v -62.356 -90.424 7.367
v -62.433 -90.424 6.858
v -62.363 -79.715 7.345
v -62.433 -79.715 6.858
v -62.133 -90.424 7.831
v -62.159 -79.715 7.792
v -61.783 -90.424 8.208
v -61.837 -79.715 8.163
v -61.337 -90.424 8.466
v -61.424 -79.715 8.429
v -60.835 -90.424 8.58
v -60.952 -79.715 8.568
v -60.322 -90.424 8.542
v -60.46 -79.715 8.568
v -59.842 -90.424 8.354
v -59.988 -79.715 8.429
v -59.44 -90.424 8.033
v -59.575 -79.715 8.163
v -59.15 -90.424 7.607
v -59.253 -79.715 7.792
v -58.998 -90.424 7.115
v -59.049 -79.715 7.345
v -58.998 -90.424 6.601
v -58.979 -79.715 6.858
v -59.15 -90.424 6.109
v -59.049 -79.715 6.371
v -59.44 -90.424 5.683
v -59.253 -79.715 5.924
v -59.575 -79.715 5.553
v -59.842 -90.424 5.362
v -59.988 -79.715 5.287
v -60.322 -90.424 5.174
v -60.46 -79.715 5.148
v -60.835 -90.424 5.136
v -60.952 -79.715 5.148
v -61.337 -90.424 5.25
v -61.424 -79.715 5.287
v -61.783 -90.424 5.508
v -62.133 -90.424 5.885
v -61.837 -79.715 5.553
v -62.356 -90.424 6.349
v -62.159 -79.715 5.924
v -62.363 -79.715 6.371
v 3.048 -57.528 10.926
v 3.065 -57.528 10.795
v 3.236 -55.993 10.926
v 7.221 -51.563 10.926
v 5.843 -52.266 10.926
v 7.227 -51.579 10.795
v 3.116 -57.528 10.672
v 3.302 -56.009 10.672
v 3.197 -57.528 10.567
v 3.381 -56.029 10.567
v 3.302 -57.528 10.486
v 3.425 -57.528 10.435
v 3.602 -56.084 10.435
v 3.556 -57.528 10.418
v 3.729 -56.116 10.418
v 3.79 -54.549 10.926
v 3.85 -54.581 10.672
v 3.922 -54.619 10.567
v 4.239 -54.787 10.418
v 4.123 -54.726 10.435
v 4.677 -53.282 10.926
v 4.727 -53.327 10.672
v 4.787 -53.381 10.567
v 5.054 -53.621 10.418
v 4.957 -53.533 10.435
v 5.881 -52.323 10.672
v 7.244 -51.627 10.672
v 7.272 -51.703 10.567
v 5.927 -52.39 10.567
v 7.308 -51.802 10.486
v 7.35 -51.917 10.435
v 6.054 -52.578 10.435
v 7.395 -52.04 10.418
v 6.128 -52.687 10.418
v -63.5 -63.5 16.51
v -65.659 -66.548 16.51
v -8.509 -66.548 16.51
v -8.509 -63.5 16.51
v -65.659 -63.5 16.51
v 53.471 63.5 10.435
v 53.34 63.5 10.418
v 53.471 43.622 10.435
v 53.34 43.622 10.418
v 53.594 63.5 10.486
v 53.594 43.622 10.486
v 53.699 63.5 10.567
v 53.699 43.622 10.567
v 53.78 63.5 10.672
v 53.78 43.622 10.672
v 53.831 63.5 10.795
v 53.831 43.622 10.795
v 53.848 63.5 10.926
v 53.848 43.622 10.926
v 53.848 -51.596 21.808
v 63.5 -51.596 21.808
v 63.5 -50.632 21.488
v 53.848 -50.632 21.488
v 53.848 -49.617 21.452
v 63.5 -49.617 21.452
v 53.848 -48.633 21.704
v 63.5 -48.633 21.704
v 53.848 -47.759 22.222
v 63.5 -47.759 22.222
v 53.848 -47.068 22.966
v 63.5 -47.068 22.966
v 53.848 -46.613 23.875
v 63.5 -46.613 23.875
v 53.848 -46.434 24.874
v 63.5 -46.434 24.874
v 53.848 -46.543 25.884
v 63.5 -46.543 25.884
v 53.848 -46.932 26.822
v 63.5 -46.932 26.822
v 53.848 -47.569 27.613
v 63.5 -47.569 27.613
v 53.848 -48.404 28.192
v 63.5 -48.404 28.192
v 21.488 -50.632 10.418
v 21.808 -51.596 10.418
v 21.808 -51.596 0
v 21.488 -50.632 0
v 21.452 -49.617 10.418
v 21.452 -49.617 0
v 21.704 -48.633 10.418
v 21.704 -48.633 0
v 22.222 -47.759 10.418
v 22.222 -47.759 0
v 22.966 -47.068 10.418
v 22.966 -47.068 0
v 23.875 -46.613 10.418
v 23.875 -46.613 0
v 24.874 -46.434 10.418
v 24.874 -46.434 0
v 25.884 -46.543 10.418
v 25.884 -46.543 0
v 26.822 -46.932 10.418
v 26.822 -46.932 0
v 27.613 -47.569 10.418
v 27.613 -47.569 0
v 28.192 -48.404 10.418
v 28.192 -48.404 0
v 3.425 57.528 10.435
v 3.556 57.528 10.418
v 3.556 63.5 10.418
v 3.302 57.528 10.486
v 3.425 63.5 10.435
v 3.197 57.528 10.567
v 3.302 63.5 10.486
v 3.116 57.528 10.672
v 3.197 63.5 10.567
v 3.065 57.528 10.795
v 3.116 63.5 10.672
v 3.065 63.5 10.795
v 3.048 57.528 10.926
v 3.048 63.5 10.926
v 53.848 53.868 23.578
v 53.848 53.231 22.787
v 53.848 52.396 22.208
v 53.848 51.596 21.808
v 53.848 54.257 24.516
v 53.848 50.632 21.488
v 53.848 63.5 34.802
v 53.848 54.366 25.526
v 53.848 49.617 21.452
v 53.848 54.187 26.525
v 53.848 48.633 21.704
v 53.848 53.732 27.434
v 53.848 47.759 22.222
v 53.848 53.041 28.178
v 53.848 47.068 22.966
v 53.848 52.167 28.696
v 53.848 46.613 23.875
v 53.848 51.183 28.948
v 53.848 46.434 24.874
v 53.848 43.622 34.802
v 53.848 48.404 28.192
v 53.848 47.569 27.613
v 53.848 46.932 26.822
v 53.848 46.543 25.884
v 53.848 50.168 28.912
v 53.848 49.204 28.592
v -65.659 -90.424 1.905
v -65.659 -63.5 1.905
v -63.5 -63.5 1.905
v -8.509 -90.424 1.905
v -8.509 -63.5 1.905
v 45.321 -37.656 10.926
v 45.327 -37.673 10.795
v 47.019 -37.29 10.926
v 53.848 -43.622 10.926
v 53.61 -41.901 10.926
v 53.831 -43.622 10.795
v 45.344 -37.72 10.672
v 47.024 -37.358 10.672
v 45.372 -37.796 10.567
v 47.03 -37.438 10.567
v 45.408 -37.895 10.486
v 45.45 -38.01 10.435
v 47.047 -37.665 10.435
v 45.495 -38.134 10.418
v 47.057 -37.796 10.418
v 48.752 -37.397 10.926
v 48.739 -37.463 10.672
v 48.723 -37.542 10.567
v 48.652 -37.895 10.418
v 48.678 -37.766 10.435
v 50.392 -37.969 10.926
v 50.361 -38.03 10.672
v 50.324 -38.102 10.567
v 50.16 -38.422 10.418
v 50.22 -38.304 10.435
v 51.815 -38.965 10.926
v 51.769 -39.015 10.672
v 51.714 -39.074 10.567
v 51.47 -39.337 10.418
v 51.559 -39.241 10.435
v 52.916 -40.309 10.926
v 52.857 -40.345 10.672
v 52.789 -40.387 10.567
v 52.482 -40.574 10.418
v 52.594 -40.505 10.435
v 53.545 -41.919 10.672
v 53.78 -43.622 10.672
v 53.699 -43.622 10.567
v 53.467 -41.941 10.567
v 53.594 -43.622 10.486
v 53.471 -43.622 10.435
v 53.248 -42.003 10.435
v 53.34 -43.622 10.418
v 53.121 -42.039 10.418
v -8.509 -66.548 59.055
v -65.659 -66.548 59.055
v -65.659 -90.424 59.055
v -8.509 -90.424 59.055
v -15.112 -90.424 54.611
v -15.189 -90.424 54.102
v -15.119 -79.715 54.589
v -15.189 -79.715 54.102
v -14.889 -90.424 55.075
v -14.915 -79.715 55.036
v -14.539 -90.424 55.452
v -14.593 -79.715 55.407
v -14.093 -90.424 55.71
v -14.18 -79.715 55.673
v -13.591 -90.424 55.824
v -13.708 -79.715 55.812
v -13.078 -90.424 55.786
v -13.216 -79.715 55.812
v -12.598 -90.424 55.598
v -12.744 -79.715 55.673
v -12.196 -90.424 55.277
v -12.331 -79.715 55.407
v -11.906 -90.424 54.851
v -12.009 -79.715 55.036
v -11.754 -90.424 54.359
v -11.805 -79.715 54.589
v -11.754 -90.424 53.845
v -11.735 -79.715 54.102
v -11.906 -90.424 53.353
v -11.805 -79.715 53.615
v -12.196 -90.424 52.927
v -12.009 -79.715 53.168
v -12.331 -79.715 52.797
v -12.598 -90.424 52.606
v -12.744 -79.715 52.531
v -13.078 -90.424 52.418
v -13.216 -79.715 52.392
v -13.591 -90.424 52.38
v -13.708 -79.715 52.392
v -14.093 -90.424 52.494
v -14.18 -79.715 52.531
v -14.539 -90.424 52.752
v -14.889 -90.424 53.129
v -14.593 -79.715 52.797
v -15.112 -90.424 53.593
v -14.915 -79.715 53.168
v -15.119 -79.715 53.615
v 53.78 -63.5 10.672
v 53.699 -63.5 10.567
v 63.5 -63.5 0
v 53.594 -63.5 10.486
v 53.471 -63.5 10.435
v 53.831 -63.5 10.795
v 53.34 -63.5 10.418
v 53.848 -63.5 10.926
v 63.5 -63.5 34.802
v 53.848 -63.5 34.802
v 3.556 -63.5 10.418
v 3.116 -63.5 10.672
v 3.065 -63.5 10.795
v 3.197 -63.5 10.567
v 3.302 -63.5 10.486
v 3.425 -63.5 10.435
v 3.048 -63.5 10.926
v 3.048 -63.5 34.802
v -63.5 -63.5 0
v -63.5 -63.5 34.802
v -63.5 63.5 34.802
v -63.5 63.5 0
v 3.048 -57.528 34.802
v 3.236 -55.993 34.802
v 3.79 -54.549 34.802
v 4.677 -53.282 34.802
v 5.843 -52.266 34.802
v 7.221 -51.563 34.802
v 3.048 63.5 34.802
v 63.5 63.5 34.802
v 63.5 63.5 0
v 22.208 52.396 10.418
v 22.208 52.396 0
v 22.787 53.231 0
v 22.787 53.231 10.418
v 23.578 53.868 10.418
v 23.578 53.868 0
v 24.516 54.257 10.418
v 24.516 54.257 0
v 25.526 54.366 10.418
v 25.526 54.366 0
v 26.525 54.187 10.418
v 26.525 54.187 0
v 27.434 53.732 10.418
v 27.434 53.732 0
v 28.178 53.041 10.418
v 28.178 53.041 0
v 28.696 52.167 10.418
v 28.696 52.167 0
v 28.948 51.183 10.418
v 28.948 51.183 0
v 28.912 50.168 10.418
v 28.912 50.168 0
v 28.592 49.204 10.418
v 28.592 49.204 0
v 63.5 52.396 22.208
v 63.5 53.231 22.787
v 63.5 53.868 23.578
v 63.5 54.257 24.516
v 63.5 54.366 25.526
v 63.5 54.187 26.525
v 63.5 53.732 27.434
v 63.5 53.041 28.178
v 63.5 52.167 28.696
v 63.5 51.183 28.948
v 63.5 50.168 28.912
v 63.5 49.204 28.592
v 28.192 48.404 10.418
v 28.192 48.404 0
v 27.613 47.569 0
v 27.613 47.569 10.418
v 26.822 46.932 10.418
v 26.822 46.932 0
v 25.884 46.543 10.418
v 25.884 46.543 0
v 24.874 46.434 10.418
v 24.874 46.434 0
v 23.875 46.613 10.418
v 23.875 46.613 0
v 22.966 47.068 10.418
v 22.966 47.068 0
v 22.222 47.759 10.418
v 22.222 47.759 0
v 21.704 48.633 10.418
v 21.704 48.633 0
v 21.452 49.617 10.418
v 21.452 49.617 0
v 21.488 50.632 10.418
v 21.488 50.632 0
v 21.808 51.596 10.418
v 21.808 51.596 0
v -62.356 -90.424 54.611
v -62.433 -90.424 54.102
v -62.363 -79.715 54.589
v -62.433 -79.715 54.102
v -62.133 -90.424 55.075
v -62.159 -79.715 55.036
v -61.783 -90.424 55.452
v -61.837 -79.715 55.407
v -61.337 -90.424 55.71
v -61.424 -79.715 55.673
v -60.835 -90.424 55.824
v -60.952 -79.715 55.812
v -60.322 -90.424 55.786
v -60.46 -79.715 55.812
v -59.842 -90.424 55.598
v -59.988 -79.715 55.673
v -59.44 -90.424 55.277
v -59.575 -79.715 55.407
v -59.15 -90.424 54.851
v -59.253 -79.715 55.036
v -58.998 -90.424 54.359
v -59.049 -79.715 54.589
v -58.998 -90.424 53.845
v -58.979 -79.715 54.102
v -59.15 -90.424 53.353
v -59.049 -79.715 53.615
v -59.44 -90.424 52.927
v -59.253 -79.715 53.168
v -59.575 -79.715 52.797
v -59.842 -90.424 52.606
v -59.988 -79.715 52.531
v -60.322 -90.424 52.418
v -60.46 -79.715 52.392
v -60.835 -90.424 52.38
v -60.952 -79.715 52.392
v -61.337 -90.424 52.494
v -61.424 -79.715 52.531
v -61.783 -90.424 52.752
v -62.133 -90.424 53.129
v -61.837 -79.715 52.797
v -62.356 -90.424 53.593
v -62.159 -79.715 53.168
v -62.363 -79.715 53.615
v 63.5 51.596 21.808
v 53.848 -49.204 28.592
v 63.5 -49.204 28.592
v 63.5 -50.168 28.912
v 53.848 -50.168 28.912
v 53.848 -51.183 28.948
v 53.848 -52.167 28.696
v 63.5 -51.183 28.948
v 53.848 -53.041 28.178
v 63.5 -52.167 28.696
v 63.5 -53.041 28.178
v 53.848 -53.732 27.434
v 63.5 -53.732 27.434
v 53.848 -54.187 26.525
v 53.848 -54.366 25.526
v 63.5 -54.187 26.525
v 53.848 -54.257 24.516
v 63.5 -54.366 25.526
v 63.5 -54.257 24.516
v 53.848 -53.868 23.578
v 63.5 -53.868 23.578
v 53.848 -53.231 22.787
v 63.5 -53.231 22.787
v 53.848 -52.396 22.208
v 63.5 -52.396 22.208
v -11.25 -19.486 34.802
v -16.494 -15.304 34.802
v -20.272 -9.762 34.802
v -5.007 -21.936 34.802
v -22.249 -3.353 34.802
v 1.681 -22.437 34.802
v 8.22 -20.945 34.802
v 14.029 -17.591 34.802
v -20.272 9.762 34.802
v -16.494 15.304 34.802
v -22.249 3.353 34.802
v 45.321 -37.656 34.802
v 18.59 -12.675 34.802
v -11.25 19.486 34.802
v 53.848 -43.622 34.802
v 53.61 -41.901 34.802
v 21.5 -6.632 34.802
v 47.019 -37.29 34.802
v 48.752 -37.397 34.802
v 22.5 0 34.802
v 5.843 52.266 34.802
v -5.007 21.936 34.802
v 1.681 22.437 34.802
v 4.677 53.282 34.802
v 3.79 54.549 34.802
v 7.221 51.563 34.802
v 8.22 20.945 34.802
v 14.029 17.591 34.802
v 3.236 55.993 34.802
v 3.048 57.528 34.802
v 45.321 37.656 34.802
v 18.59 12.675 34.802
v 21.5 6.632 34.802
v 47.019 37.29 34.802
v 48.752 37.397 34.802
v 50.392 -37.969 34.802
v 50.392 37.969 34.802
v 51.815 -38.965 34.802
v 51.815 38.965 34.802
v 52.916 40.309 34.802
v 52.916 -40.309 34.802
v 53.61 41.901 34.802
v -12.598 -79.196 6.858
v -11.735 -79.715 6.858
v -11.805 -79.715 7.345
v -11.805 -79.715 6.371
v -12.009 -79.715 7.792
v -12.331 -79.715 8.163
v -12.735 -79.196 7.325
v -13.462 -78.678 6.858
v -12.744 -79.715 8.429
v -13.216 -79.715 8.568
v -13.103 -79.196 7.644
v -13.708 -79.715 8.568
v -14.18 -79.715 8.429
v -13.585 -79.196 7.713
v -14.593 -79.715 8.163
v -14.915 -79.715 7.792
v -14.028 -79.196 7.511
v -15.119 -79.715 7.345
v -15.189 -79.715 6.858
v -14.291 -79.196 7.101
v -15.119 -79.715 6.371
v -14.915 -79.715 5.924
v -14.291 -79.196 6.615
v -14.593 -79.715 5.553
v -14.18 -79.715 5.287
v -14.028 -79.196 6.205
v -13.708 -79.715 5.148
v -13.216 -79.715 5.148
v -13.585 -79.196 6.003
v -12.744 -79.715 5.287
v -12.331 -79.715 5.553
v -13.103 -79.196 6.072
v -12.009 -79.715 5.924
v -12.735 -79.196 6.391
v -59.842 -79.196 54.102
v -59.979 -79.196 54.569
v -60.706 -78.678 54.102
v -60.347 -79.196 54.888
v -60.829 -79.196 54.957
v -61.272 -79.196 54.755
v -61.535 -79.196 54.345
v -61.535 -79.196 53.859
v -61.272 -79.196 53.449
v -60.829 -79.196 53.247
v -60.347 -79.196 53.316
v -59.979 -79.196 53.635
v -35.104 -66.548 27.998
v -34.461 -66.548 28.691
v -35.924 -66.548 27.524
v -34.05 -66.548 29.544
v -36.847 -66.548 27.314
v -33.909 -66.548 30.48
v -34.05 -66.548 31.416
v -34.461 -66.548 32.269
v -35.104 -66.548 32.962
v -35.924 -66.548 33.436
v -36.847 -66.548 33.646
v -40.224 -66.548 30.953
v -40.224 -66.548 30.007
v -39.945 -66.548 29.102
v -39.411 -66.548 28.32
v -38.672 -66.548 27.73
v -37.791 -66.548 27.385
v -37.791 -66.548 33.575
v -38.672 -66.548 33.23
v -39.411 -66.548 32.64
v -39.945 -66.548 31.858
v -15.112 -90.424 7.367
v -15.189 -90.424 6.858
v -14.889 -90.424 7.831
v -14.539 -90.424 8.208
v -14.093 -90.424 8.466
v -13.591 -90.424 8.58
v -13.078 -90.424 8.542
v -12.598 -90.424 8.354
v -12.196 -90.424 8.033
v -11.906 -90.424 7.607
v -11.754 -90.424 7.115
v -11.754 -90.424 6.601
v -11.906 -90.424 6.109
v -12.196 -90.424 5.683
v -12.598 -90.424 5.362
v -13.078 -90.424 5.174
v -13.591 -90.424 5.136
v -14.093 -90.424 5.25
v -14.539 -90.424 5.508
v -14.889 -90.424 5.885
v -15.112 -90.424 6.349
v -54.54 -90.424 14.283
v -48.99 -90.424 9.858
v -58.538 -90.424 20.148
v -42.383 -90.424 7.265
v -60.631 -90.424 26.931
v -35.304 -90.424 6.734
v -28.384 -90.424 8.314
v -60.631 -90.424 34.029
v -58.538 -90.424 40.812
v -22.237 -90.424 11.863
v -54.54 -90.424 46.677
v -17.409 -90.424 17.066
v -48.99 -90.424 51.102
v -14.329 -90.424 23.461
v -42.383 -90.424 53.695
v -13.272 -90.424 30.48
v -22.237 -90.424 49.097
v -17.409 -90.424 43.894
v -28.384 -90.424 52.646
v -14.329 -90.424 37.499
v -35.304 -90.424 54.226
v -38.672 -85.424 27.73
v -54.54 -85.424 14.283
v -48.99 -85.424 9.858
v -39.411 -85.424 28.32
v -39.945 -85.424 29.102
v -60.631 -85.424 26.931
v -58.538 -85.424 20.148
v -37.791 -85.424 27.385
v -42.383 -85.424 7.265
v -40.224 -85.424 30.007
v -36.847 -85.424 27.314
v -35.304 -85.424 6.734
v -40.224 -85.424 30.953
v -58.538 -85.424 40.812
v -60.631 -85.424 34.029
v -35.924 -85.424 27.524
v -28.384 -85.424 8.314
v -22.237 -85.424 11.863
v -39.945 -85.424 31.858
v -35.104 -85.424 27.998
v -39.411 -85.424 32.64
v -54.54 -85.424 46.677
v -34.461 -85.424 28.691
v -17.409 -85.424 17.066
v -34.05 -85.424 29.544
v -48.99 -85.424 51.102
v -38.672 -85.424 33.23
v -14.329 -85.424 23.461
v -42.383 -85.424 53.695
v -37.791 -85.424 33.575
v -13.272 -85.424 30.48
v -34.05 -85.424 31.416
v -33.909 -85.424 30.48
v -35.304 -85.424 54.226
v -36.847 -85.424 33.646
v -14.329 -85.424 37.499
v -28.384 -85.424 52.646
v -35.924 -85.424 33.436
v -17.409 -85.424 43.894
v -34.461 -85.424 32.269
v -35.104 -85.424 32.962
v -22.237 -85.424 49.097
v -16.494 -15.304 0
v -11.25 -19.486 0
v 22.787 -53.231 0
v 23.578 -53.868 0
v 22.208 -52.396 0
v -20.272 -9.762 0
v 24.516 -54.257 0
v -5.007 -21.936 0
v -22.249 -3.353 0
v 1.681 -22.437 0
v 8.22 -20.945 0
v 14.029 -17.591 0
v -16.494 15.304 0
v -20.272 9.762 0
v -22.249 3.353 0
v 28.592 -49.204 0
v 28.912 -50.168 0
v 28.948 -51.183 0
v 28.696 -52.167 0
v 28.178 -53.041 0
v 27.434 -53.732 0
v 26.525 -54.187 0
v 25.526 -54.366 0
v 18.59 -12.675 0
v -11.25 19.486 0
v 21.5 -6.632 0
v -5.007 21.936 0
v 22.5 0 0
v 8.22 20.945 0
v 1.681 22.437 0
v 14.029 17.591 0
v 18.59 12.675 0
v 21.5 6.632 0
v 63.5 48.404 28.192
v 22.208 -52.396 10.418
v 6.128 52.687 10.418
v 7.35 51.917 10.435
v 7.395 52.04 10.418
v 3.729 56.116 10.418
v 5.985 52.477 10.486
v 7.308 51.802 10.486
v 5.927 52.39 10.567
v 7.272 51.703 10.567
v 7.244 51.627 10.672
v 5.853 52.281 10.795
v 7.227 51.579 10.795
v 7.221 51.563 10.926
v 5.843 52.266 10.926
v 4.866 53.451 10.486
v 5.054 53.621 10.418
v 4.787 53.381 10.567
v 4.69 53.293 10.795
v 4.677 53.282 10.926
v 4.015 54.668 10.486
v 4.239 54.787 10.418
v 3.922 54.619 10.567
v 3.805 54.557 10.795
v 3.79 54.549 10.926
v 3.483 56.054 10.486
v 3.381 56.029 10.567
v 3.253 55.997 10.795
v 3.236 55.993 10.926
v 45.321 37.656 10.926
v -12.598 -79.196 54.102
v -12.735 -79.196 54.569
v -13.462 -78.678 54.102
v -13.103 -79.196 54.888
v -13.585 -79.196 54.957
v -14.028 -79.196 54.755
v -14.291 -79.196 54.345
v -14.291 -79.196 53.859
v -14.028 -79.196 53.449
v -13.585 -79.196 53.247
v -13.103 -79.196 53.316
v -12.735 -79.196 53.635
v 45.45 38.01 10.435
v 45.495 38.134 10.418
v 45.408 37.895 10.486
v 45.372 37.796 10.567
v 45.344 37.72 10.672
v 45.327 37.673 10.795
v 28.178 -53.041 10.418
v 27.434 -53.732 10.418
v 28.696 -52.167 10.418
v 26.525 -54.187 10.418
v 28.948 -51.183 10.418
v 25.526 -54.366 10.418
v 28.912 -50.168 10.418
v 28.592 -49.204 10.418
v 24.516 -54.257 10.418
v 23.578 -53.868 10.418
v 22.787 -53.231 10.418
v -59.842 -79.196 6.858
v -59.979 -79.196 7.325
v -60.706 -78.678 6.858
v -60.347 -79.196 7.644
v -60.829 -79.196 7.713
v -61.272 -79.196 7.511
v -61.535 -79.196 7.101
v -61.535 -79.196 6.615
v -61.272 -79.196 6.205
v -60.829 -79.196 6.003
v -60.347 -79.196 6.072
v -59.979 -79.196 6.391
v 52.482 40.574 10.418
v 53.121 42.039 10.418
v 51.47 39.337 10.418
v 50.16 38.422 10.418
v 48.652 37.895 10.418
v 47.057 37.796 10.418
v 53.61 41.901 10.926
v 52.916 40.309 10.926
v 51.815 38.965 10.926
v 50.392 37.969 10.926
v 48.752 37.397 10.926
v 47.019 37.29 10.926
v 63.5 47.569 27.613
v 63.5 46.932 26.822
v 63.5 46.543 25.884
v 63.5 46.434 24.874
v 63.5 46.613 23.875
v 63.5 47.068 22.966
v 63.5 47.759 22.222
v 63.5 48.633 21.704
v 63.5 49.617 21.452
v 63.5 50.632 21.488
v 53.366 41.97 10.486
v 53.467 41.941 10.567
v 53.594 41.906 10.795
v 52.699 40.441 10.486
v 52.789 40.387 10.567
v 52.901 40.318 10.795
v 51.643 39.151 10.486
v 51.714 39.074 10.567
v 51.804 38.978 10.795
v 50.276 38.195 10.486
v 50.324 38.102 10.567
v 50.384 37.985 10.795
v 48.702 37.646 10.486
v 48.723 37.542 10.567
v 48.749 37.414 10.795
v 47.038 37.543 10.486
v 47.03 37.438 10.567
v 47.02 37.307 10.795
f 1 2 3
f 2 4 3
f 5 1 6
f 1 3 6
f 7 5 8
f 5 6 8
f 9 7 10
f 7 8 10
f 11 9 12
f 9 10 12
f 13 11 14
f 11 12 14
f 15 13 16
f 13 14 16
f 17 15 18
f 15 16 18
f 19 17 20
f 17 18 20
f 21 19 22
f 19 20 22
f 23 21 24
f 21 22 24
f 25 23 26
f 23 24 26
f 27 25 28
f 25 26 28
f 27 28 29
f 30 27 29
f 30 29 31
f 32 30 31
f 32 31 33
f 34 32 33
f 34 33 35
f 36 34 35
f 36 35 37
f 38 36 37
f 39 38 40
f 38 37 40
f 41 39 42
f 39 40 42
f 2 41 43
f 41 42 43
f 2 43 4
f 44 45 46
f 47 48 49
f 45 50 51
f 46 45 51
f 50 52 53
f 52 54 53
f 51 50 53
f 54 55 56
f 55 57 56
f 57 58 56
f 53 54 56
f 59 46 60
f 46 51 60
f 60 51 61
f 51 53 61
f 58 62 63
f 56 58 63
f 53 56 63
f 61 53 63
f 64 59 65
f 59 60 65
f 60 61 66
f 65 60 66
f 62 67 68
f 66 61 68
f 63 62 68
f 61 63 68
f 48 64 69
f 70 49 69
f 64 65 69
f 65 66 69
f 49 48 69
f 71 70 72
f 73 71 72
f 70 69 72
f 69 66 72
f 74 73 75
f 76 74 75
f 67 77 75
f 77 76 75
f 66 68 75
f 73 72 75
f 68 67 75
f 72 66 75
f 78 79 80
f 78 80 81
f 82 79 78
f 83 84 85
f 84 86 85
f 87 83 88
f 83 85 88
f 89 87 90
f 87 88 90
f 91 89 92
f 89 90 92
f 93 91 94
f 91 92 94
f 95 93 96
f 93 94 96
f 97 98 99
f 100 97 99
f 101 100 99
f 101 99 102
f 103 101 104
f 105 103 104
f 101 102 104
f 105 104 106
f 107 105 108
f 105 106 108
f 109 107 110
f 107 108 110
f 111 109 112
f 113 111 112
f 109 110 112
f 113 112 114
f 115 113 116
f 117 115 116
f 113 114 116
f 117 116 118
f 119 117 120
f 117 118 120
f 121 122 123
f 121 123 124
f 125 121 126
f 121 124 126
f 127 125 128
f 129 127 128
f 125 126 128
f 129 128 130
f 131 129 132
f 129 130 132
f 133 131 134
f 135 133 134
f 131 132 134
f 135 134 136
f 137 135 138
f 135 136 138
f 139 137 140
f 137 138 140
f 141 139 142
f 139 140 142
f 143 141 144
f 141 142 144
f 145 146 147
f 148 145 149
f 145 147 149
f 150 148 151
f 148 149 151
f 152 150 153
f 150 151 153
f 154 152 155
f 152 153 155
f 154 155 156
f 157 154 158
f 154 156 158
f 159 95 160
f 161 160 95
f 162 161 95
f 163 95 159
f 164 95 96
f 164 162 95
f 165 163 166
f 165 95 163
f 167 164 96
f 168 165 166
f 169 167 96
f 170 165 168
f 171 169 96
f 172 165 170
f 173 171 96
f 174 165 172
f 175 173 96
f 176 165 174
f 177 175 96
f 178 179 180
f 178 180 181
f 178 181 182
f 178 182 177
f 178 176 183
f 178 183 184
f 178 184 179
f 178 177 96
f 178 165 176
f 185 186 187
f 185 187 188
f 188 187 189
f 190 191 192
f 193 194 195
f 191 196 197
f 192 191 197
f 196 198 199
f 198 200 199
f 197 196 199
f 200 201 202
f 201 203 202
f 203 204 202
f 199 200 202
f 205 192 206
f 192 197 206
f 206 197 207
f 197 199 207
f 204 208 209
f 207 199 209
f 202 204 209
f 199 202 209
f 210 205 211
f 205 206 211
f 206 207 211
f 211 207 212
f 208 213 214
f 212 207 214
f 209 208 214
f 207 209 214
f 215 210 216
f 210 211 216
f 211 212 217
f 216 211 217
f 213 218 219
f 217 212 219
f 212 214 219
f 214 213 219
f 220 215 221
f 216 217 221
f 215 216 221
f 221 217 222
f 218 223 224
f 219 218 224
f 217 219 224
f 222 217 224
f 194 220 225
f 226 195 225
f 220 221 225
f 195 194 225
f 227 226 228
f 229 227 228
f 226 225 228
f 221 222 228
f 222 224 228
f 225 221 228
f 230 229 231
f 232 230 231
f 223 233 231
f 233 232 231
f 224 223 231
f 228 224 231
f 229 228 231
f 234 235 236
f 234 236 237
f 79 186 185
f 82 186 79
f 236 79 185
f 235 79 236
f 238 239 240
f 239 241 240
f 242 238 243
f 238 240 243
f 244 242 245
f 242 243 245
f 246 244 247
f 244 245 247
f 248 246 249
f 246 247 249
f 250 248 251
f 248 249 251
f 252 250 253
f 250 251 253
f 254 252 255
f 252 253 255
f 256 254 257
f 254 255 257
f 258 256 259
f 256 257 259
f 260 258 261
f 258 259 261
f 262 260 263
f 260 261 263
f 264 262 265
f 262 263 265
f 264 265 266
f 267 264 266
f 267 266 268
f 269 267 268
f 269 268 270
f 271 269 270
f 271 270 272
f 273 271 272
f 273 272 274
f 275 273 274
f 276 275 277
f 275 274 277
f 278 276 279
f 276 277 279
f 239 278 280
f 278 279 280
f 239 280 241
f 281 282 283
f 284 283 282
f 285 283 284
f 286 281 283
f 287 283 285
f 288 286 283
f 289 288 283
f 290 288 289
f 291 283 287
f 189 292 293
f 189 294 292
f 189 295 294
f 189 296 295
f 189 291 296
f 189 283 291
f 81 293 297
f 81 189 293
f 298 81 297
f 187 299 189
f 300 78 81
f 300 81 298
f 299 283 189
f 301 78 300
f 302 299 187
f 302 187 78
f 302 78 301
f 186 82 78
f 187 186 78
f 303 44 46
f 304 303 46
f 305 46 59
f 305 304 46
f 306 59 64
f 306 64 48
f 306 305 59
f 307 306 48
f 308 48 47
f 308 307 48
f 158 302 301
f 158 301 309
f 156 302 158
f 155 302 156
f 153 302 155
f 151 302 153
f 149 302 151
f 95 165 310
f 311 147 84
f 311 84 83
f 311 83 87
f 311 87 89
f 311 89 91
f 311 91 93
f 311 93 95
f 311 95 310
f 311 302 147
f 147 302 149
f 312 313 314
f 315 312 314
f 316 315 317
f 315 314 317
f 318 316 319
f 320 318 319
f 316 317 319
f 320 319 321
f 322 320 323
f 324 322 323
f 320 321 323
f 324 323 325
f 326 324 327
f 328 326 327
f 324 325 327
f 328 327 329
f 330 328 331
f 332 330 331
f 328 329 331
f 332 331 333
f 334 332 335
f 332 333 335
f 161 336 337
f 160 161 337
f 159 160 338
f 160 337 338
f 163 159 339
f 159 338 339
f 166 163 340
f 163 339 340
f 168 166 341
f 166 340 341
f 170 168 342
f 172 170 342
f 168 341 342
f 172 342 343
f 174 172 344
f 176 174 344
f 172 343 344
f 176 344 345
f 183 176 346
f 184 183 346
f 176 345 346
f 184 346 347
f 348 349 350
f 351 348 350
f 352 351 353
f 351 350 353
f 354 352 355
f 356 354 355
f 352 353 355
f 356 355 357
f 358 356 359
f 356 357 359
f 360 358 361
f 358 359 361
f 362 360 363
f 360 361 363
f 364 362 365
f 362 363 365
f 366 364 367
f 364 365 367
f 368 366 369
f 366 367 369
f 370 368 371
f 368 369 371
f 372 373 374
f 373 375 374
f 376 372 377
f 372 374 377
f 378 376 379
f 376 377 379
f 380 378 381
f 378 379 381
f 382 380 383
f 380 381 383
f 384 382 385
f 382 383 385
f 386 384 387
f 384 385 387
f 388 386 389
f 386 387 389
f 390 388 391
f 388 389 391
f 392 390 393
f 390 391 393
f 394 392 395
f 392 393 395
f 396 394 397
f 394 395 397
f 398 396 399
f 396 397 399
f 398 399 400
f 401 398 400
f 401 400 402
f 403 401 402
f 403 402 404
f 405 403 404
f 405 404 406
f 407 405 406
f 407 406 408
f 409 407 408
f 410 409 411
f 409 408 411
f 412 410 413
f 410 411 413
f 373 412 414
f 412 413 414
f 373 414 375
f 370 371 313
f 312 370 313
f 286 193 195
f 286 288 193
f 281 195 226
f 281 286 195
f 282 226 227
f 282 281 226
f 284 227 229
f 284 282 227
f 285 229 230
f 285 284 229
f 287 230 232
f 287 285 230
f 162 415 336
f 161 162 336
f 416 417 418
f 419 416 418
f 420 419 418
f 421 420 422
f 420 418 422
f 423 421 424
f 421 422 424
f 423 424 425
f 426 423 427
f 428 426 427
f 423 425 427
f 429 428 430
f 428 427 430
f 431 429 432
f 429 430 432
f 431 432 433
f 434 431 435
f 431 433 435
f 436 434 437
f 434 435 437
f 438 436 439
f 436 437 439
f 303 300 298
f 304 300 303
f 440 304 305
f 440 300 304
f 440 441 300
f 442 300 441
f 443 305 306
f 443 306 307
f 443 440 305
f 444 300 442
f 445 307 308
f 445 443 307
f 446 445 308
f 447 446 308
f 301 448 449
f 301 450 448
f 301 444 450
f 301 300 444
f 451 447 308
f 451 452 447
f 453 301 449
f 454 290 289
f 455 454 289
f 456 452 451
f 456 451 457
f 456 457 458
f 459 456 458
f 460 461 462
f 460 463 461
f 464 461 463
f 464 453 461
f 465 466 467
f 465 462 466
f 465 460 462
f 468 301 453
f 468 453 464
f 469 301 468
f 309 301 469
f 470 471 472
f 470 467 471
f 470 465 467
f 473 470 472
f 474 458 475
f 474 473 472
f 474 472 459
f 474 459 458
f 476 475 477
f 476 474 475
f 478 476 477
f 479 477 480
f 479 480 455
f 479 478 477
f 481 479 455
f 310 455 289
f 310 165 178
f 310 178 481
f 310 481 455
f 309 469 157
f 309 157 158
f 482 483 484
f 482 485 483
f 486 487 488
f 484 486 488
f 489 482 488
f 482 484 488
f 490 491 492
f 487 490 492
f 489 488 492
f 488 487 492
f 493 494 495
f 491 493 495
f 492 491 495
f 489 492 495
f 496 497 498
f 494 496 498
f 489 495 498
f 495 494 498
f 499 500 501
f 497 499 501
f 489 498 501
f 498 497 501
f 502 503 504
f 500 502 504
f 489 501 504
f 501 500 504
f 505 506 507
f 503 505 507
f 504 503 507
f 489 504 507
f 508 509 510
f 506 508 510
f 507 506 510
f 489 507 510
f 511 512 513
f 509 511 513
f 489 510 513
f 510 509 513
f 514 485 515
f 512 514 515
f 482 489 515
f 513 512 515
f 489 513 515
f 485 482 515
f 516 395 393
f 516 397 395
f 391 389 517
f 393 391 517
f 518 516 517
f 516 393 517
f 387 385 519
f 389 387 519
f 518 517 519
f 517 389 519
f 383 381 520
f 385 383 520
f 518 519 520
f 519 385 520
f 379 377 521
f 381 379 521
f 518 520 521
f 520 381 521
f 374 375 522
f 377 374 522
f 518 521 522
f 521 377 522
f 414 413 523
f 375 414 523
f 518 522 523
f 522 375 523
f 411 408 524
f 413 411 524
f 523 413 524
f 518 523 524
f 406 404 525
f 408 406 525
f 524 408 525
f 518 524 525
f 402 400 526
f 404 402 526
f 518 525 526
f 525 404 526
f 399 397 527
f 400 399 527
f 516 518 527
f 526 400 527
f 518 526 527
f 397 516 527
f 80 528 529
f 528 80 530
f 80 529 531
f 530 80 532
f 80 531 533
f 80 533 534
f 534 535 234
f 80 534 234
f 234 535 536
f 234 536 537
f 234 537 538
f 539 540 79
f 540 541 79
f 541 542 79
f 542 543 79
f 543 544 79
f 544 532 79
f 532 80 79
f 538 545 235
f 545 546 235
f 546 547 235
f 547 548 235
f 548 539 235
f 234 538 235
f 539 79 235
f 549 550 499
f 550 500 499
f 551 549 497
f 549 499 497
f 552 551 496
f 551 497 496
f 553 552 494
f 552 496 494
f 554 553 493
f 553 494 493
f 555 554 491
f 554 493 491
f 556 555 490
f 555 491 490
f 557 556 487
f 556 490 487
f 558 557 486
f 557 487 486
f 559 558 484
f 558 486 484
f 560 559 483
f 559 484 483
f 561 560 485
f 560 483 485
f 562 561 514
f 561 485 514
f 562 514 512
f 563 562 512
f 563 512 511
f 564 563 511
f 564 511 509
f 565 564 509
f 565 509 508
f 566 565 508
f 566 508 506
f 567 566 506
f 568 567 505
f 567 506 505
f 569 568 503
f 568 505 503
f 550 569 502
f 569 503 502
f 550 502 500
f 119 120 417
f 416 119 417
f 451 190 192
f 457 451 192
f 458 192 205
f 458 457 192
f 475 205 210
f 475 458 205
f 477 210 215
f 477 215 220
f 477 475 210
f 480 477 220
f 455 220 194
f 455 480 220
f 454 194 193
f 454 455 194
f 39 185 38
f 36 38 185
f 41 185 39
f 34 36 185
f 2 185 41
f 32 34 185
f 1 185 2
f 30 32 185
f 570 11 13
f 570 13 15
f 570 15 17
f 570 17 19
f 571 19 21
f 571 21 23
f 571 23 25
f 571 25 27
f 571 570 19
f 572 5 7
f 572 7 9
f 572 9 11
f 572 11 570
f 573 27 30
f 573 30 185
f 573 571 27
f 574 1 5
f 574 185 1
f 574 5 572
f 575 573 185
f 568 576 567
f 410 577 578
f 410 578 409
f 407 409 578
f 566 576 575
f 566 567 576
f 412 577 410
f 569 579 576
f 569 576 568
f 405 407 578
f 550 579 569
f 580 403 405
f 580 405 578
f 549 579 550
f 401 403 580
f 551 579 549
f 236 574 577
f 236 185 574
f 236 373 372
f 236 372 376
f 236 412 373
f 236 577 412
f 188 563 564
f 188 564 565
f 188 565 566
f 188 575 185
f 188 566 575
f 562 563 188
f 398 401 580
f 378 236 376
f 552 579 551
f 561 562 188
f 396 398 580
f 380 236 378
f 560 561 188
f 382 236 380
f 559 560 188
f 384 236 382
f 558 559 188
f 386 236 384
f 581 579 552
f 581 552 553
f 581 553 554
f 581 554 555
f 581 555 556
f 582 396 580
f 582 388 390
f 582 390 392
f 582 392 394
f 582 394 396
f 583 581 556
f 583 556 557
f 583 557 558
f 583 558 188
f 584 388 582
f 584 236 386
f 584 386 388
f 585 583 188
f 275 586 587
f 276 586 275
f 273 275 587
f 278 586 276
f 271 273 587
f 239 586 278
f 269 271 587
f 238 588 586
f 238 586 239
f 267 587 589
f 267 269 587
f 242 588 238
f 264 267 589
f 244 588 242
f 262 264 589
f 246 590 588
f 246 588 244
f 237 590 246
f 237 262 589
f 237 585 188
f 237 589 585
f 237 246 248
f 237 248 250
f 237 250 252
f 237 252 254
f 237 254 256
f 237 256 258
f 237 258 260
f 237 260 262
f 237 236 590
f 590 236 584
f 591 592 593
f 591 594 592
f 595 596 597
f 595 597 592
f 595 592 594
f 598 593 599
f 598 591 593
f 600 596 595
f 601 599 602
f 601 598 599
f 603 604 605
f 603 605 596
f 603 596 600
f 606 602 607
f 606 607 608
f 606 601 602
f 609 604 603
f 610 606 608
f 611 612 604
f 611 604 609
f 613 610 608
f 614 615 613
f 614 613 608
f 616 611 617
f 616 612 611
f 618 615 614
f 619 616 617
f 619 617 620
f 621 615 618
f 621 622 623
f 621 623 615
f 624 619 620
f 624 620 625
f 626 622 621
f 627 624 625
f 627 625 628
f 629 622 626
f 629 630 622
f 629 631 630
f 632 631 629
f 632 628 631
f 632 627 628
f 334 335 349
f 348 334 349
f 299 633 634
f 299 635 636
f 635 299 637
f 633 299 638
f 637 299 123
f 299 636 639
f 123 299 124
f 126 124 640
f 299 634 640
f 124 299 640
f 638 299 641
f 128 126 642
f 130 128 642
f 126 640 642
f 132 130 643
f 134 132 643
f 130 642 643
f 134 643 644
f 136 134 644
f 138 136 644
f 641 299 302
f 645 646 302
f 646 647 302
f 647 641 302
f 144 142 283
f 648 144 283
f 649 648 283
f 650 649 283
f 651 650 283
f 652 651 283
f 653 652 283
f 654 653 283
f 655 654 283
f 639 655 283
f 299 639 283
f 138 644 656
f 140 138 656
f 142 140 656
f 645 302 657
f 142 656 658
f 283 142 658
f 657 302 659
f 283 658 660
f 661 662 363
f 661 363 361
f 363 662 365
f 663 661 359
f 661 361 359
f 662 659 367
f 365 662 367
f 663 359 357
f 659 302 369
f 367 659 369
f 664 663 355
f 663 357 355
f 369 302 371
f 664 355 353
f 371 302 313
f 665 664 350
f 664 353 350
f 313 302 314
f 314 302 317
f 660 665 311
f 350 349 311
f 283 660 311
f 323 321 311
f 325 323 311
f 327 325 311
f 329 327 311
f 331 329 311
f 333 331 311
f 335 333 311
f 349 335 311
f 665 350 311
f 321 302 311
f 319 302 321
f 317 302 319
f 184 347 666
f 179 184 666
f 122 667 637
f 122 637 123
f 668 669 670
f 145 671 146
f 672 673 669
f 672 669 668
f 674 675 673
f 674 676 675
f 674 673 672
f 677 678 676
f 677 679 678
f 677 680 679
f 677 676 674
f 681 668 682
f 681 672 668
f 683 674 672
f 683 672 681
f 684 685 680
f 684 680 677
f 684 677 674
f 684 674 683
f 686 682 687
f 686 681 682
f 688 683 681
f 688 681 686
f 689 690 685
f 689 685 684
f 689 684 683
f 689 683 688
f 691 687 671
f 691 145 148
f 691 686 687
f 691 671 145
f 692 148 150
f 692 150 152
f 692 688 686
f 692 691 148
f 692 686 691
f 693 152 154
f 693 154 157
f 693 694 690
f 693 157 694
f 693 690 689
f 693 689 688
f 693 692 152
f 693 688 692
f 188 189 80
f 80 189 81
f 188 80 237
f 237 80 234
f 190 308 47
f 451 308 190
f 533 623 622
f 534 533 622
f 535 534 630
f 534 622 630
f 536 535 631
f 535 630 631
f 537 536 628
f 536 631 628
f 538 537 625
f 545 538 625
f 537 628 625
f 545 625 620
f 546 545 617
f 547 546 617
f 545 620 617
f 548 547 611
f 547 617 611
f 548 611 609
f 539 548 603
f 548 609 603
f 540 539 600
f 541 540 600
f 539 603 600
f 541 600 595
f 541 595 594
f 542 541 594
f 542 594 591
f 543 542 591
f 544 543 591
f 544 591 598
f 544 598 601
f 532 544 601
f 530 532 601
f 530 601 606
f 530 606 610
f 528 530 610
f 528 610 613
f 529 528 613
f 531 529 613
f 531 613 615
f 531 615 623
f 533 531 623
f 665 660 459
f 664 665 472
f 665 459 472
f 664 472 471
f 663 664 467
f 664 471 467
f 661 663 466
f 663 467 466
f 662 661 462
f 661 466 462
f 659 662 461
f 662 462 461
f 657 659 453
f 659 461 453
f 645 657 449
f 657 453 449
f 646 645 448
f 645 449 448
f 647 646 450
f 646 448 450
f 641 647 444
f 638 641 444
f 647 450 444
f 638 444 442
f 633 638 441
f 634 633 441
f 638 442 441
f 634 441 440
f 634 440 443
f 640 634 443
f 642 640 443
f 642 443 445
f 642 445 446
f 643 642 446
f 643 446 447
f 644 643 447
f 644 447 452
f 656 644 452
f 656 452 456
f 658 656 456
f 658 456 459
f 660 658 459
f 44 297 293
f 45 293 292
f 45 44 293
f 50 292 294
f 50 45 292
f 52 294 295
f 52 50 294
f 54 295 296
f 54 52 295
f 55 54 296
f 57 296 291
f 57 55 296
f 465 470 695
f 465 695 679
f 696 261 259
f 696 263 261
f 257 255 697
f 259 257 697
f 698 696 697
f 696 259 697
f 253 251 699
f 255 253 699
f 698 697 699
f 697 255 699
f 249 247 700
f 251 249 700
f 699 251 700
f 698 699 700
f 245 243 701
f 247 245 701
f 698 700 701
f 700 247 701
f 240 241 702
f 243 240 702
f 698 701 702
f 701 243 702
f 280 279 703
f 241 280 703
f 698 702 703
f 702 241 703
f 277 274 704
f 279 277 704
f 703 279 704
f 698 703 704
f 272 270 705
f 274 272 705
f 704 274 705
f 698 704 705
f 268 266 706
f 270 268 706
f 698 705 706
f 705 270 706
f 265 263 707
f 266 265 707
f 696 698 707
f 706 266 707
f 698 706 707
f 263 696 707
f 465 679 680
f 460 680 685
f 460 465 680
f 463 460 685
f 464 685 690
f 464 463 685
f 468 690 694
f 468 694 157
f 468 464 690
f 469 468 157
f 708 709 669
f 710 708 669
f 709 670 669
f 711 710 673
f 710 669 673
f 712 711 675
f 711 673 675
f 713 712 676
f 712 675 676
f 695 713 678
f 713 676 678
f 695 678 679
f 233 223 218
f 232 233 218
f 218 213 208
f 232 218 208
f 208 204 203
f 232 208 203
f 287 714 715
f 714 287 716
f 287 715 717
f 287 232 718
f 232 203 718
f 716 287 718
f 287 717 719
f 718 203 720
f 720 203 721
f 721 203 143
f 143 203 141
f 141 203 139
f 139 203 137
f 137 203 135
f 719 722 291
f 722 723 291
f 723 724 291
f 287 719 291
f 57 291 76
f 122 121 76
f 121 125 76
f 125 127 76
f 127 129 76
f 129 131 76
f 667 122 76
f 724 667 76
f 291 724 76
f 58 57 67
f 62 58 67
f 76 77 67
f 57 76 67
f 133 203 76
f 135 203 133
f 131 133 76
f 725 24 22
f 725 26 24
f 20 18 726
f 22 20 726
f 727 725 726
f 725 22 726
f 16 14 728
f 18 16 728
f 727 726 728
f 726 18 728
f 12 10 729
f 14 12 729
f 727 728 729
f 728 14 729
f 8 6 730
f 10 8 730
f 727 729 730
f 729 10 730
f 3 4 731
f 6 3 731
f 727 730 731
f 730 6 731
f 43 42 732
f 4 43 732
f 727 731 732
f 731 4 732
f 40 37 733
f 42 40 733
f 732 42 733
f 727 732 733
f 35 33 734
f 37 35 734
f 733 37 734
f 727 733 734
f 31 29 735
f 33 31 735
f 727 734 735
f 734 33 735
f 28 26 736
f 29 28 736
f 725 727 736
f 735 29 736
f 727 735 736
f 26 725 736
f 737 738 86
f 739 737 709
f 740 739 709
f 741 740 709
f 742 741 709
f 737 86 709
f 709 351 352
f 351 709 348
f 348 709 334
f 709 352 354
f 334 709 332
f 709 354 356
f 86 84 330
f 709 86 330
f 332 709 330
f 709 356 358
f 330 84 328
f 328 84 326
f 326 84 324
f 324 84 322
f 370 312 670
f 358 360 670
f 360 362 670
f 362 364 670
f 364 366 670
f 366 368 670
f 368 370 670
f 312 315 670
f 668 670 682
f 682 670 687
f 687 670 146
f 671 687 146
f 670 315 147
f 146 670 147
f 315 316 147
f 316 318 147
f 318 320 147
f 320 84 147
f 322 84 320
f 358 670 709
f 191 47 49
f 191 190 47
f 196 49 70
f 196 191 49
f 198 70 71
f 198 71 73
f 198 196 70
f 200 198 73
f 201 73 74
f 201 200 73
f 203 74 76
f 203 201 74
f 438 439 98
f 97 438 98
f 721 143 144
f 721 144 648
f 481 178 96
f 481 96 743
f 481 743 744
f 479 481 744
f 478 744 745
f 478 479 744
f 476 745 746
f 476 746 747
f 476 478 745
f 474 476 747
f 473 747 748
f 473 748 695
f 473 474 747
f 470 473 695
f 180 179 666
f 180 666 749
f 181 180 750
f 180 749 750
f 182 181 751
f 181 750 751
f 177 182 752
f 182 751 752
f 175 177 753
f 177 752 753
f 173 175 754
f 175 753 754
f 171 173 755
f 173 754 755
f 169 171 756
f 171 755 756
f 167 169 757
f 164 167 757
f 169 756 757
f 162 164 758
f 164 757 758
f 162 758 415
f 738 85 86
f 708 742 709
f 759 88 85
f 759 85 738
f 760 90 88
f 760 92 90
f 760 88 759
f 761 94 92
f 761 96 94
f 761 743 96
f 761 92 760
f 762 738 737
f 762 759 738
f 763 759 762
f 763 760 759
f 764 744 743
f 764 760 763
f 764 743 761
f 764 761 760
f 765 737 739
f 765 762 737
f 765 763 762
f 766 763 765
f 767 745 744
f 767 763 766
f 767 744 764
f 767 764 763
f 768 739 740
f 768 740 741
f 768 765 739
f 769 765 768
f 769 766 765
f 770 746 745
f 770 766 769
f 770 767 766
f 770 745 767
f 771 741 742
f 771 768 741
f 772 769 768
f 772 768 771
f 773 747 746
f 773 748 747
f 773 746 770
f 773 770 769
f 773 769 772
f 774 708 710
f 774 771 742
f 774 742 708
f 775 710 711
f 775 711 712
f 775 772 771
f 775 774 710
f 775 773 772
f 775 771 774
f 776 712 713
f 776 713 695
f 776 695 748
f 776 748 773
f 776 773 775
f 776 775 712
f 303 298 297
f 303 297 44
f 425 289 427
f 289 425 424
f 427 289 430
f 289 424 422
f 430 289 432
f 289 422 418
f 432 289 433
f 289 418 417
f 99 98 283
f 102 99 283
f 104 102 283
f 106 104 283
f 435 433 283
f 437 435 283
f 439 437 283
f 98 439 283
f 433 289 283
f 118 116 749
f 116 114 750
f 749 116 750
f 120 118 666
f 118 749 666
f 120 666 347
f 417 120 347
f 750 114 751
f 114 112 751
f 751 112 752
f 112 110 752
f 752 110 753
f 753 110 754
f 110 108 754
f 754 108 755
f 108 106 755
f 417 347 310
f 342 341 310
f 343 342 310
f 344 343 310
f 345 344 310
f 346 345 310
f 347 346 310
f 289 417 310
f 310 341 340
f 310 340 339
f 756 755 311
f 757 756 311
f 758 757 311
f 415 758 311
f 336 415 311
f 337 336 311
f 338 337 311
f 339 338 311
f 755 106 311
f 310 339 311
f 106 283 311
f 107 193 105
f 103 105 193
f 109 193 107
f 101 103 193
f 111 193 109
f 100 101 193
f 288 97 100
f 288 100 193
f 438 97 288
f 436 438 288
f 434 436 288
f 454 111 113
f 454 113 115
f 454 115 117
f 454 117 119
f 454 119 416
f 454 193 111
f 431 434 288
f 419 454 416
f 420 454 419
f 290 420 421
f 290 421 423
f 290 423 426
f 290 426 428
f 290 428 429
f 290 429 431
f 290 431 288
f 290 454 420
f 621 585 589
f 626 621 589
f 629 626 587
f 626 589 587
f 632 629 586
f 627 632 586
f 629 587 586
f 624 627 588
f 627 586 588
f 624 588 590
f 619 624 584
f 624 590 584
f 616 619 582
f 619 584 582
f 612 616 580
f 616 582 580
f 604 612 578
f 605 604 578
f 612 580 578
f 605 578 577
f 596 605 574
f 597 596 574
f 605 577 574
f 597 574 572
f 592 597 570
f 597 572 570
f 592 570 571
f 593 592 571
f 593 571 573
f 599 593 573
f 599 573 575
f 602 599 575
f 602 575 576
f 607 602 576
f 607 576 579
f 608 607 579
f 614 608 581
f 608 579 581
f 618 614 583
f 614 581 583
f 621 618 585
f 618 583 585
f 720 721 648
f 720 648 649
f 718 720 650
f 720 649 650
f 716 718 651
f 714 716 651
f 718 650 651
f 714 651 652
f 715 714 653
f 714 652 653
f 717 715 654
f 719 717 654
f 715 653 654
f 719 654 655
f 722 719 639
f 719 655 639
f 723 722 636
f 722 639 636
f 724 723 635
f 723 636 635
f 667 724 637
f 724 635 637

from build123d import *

# Parameters (mm, degrees)
SKETCH2_W                        = 127
SKETCH2_H                        = 127
HOUSING_DEPTH                    = 39.5
SKETCH4_OUTSIDE_W                = 165.78
SKETCH4_OUTSIDE_H                = 165.78
SKETCH4_OUTSIDE_R                = 45.974
CUT_EXTRUDE2_DEPTH               = 4.698
MOUNTING_POCKETS_DEPTH           = 24.384
ENG_METRIC_SLOT_VERTICAL_REACH   = 129
ENG_METRIC_SLOT_HORIZONTAL_DEPTH = 40.5
FILLET3_R                        = 0.508
SKETCH213_W                      = 57.15
SKETCH213_H                      = 57.15
EXTRUDE1_DEPTH                   = 26.924
SKETCH214_R                      = 23.8125
CUT_EXTRUDE3_DEPTH               = 5
SKETCH215_R                      = 3.175
CUT_EXTRUDE4_DEPTH               = 21.924
CUT_EXTRUDE5_REACH               = 131.159
SKETCH216_W                      = 42.545
SKETCH216_H                      = 3.048
F_8_32_TAPPED_HOLE1_D            = 3.4544
F_8_32_TAPPED_HOLE1_DEPTH        = 10.7086
F_8_32_TAPPED_HOLE1_TIP          = 1.037806461
SKETCH241_R                      = 45.974
CUT_EXTRUDE7_DEPTH               = 4.698
SKETCH3_R                        = 22.5
CUT_EXTRUDE8_DEPTH               = 49.26


with BuildPart() as part:
    # Sketch2 → HOUSING (new body)
    with BuildSketch(Plane.XY):
        Rectangle(SKETCH2_W, SKETCH2_H)
    extrude(amount=HOUSING_DEPTH)

    # Sketch4 outside → Cut-Extrude2 (cut)
    with BuildSketch(Plane.XY.offset(39.5)):
        Rectangle(SKETCH4_OUTSIDE_W, SKETCH4_OUTSIDE_H)
        Circle(SKETCH4_OUTSIDE_R, mode=Mode.SUBTRACT)
    extrude(amount=-CUT_EXTRUDE2_DEPTH, mode=Mode.SUBTRACT)

    # Sketch8 → MOUNTING POCKETS (cut)
    with BuildSketch(Plane.XY.offset(34.802)):
        with BuildLine():
            Line((3.048, -63.5), (3.048, -57.528018122))
            ThreePointArc((3.048, -57.528018122), (4.194729662, -53.888172274), (7.220748912, -51.562946647))
            Line((7.220748912, -51.562946647), (45.320748912, -37.656446647))
            ThreePointArc((45.320748912, -37.656446647), (51.137845848, -38.418247784), (53.848, -43.621518122))
            Line((53.848, -43.621518122), (53.848, -63.5))
            Line((53.848, -63.5), (3.048, -63.5))
        make_face()
        with BuildLine():
            Line((3.048, 63.5), (53.848, 63.5))
            Line((53.848, 63.5), (53.848, 43.621518122))
            ThreePointArc((53.848, 43.621518122), (51.137845848, 38.418247784), (45.320748912, 37.656446647))
            Line((45.320748912, 37.656446647), (7.220748912, 51.562946647))
            ThreePointArc((7.220748912, 51.562946647), (4.194729662, 53.888172274), (3.048, 57.528018122))
            Line((3.048, 57.528018122), (3.048, 63.5))
        make_face()
    extrude(amount=-MOUNTING_POCKETS_DEPTH, mode=Mode.SUBTRACT)

    # Sketch21 → ENG_METRIC SLOT VERTICAL (cut, up to next)
    with BuildSketch(Plane(origin=(63.5, -23.646142673, 1.166551585), x_dir=(0, 0, -1), z_dir=(1, 0, 0)), mode=Mode.PRIVATE) as eng_metric_slot_vertical_sk1:
        with BuildLine():
            Line((-20.641506099, 75.242113831), (-21.041506099, 76.042113831))
            ThreePointArc((-21.041506099, 76.042113831), (-25.829419573, 77.63808499), (-27.425390732, 72.850171515))
            Line((-27.425390732, 72.850171515), (-27.025390732, 72.050171515))
            ThreePointArc((-27.025390732, 72.050171515), (-22.237477257, 70.454200357), (-20.641506099, 75.242113831))
        make_face()
    eng_metric_slot_vertical_tool1 = extrude(eng_metric_slot_vertical_sk1.sketch, amount=-ENG_METRIC_SLOT_VERTICAL_REACH, mode=Mode.PRIVATE) & part.part
    add(eng_metric_slot_vertical_tool1.solids().sort_by_distance((63.5, 50.4, 25.2))[0], mode=Mode.SUBTRACT)
    # Sketch21 → ENG_METRIC SLOT VERTICAL (cut, up to next)
    with BuildSketch(Plane(origin=(63.5, -23.646142673, 1.166551585), x_dir=(0, 0, -1), z_dir=(1, 0, 0)), mode=Mode.PRIVATE) as eng_metric_slot_vertical_sk2:
        with BuildLine():
            Line((-27.025390732, -24.757886169), (-27.425390732, -25.557886169))
            ThreePointArc((-27.425390732, -25.557886169), (-25.829419573, -30.345799643), (-21.041506099, -28.749828485))
            Line((-21.041506099, -28.749828485), (-20.641506099, -27.949828485))
            ThreePointArc((-20.641506099, -27.949828485), (-22.237477257, -23.16191501), (-27.025390732, -24.757886169))
        make_face()
    eng_metric_slot_vertical_tool2 = extrude(eng_metric_slot_vertical_sk2.sketch, amount=-ENG_METRIC_SLOT_VERTICAL_REACH, mode=Mode.PRIVATE) & part.part
    add(eng_metric_slot_vertical_tool2.solids().sort_by_distance((63.5, -50.4, 25.2))[0], mode=Mode.SUBTRACT)

    # Sketch212 → ENG_METRIC SLOT HORIZONTAL (cut, through all)
    with BuildSketch(Plane(origin=(34.062086582, -104.655987826, 0), x_dir=(-1, 0, 0), z_dir=(0, 0, -1))):
        with BuildLine():
            Line((12.254028899, 156.251958985), (11.854028899, 157.051958985))
            ThreePointArc((11.854028899, 157.051958985), (7.066115424, 158.647930143), (5.470144266, 153.860016668))
            Line((5.470144266, 153.860016668), (5.870144266, 153.060016668))
            ThreePointArc((5.870144266, 153.060016668), (10.658057741, 151.46404551), (12.254028899, 156.251958985))
        make_face()
        with BuildLine():
            Line((5.870144266, 56.251958985), (5.470144266, 55.451958985))
            ThreePointArc((5.470144266, 55.451958985), (7.066115424, 50.66404551), (11.854028899, 52.260016668))
            Line((11.854028899, 52.260016668), (12.254028899, 53.060016668))
            ThreePointArc((12.254028899, 53.060016668), (10.658057741, 57.847930143), (5.870144266, 56.251958985))
        make_face()
    extrude(amount=-ENG_METRIC_SLOT_HORIZONTAL_DEPTH, mode=Mode.SUBTRACT)

    # Fillet3
    fillet3_edges = [part.edges().sort_by_distance(p)[0] for p in [
        (3.048, -60.514009061, 10.418),
        (4.194729662, -53.888172274, 10.418),
        (26.270748912, -44.609696647, 10.418),
        (51.137845848, -38.418247784, 10.418),
        (53.848, -53.560759061, 10.418),
        (51.137845848, 38.418247784, 10.418),
        (26.270748912, 44.609696647, 10.418),
        (4.194729662, 53.888172274, 10.418),
        (3.048, 60.514009061, 10.418),
        (53.848, 53.560759061, 10.418),
    ]]
    fillet(fillet3_edges, radius=FILLET3_R)

    # Sketch213 → Extrude1 (add)
    with BuildSketch(Plane.XZ.offset(63.5)):
        with Locations((-37.084, 30.48)):
            Rectangle(SKETCH213_W, SKETCH213_H)
    extrude(amount=EXTRUDE1_DEPTH)

    # Sketch214 → Cut-Extrude3 (cut)
    with BuildSketch(Plane.XZ.offset(90.424)):
        with Locations((-37.084, 30.48)):
            Circle(SKETCH214_R)
    extrude(amount=-CUT_EXTRUDE3_DEPTH, mode=Mode.SUBTRACT)

    # Sketch215 → Cut-Extrude4 (cut)
    with BuildSketch(Plane.XZ.offset(85.424)):
        with Locations((-37.084, 30.48)):
            Circle(SKETCH215_R)
    extrude(amount=-CUT_EXTRUDE4_DEPTH, mode=Mode.SUBTRACT)

    # Sketch216 → Cut-Extrude5 (cut, up to next)
    with BuildSketch(Plane.ZY.offset(65.659), mode=Mode.PRIVATE) as cut_extrude5_sk1:
        with Locations((37.7825, -65.024)):
            Rectangle(SKETCH216_W, SKETCH216_H)
    cut_extrude5_tool1 = extrude(cut_extrude5_sk1.sketch, amount=-CUT_EXTRUDE5_REACH, mode=Mode.PRIVATE) & part.part
    add(cut_extrude5_tool1.solids().sort_by_distance((-65.659, -65.024, 37.7825))[0], mode=Mode.SUBTRACT)

    # #8-32 Tapped Hole1
    with Locations(Plane.XZ.offset(90.424)):
        with Locations((-60.706, 6.858), (-60.706, 54.102), (-13.462, 54.102), (-13.462, 6.858)):
            Hole(F_8_32_TAPPED_HOLE1_D / 2, depth=F_8_32_TAPPED_HOLE1_DEPTH)
            with Locations((0, 0, -(F_8_32_TAPPED_HOLE1_DEPTH + F_8_32_TAPPED_HOLE1_TIP / 2))):  # 118° drill point
                Cone(0, F_8_32_TAPPED_HOLE1_D / 2, F_8_32_TAPPED_HOLE1_TIP, mode=Mode.SUBTRACT)

    # Sketch241 → Cut-Extrude7 (cut)
    with BuildSketch(Plane.XY.offset(39.5)):
        Circle(SKETCH241_R)
    extrude(amount=-CUT_EXTRUDE7_DEPTH, mode=Mode.SUBTRACT)

    # Sketch3 → Cut-Extrude8 (cut, through all)
    with BuildSketch(Plane.XY.offset(48.26)):
        Circle(SKETCH3_R)
    extrude(amount=-CUT_EXTRUDE8_DEPTH, mode=Mode.SUBTRACT)


solid = part.part
